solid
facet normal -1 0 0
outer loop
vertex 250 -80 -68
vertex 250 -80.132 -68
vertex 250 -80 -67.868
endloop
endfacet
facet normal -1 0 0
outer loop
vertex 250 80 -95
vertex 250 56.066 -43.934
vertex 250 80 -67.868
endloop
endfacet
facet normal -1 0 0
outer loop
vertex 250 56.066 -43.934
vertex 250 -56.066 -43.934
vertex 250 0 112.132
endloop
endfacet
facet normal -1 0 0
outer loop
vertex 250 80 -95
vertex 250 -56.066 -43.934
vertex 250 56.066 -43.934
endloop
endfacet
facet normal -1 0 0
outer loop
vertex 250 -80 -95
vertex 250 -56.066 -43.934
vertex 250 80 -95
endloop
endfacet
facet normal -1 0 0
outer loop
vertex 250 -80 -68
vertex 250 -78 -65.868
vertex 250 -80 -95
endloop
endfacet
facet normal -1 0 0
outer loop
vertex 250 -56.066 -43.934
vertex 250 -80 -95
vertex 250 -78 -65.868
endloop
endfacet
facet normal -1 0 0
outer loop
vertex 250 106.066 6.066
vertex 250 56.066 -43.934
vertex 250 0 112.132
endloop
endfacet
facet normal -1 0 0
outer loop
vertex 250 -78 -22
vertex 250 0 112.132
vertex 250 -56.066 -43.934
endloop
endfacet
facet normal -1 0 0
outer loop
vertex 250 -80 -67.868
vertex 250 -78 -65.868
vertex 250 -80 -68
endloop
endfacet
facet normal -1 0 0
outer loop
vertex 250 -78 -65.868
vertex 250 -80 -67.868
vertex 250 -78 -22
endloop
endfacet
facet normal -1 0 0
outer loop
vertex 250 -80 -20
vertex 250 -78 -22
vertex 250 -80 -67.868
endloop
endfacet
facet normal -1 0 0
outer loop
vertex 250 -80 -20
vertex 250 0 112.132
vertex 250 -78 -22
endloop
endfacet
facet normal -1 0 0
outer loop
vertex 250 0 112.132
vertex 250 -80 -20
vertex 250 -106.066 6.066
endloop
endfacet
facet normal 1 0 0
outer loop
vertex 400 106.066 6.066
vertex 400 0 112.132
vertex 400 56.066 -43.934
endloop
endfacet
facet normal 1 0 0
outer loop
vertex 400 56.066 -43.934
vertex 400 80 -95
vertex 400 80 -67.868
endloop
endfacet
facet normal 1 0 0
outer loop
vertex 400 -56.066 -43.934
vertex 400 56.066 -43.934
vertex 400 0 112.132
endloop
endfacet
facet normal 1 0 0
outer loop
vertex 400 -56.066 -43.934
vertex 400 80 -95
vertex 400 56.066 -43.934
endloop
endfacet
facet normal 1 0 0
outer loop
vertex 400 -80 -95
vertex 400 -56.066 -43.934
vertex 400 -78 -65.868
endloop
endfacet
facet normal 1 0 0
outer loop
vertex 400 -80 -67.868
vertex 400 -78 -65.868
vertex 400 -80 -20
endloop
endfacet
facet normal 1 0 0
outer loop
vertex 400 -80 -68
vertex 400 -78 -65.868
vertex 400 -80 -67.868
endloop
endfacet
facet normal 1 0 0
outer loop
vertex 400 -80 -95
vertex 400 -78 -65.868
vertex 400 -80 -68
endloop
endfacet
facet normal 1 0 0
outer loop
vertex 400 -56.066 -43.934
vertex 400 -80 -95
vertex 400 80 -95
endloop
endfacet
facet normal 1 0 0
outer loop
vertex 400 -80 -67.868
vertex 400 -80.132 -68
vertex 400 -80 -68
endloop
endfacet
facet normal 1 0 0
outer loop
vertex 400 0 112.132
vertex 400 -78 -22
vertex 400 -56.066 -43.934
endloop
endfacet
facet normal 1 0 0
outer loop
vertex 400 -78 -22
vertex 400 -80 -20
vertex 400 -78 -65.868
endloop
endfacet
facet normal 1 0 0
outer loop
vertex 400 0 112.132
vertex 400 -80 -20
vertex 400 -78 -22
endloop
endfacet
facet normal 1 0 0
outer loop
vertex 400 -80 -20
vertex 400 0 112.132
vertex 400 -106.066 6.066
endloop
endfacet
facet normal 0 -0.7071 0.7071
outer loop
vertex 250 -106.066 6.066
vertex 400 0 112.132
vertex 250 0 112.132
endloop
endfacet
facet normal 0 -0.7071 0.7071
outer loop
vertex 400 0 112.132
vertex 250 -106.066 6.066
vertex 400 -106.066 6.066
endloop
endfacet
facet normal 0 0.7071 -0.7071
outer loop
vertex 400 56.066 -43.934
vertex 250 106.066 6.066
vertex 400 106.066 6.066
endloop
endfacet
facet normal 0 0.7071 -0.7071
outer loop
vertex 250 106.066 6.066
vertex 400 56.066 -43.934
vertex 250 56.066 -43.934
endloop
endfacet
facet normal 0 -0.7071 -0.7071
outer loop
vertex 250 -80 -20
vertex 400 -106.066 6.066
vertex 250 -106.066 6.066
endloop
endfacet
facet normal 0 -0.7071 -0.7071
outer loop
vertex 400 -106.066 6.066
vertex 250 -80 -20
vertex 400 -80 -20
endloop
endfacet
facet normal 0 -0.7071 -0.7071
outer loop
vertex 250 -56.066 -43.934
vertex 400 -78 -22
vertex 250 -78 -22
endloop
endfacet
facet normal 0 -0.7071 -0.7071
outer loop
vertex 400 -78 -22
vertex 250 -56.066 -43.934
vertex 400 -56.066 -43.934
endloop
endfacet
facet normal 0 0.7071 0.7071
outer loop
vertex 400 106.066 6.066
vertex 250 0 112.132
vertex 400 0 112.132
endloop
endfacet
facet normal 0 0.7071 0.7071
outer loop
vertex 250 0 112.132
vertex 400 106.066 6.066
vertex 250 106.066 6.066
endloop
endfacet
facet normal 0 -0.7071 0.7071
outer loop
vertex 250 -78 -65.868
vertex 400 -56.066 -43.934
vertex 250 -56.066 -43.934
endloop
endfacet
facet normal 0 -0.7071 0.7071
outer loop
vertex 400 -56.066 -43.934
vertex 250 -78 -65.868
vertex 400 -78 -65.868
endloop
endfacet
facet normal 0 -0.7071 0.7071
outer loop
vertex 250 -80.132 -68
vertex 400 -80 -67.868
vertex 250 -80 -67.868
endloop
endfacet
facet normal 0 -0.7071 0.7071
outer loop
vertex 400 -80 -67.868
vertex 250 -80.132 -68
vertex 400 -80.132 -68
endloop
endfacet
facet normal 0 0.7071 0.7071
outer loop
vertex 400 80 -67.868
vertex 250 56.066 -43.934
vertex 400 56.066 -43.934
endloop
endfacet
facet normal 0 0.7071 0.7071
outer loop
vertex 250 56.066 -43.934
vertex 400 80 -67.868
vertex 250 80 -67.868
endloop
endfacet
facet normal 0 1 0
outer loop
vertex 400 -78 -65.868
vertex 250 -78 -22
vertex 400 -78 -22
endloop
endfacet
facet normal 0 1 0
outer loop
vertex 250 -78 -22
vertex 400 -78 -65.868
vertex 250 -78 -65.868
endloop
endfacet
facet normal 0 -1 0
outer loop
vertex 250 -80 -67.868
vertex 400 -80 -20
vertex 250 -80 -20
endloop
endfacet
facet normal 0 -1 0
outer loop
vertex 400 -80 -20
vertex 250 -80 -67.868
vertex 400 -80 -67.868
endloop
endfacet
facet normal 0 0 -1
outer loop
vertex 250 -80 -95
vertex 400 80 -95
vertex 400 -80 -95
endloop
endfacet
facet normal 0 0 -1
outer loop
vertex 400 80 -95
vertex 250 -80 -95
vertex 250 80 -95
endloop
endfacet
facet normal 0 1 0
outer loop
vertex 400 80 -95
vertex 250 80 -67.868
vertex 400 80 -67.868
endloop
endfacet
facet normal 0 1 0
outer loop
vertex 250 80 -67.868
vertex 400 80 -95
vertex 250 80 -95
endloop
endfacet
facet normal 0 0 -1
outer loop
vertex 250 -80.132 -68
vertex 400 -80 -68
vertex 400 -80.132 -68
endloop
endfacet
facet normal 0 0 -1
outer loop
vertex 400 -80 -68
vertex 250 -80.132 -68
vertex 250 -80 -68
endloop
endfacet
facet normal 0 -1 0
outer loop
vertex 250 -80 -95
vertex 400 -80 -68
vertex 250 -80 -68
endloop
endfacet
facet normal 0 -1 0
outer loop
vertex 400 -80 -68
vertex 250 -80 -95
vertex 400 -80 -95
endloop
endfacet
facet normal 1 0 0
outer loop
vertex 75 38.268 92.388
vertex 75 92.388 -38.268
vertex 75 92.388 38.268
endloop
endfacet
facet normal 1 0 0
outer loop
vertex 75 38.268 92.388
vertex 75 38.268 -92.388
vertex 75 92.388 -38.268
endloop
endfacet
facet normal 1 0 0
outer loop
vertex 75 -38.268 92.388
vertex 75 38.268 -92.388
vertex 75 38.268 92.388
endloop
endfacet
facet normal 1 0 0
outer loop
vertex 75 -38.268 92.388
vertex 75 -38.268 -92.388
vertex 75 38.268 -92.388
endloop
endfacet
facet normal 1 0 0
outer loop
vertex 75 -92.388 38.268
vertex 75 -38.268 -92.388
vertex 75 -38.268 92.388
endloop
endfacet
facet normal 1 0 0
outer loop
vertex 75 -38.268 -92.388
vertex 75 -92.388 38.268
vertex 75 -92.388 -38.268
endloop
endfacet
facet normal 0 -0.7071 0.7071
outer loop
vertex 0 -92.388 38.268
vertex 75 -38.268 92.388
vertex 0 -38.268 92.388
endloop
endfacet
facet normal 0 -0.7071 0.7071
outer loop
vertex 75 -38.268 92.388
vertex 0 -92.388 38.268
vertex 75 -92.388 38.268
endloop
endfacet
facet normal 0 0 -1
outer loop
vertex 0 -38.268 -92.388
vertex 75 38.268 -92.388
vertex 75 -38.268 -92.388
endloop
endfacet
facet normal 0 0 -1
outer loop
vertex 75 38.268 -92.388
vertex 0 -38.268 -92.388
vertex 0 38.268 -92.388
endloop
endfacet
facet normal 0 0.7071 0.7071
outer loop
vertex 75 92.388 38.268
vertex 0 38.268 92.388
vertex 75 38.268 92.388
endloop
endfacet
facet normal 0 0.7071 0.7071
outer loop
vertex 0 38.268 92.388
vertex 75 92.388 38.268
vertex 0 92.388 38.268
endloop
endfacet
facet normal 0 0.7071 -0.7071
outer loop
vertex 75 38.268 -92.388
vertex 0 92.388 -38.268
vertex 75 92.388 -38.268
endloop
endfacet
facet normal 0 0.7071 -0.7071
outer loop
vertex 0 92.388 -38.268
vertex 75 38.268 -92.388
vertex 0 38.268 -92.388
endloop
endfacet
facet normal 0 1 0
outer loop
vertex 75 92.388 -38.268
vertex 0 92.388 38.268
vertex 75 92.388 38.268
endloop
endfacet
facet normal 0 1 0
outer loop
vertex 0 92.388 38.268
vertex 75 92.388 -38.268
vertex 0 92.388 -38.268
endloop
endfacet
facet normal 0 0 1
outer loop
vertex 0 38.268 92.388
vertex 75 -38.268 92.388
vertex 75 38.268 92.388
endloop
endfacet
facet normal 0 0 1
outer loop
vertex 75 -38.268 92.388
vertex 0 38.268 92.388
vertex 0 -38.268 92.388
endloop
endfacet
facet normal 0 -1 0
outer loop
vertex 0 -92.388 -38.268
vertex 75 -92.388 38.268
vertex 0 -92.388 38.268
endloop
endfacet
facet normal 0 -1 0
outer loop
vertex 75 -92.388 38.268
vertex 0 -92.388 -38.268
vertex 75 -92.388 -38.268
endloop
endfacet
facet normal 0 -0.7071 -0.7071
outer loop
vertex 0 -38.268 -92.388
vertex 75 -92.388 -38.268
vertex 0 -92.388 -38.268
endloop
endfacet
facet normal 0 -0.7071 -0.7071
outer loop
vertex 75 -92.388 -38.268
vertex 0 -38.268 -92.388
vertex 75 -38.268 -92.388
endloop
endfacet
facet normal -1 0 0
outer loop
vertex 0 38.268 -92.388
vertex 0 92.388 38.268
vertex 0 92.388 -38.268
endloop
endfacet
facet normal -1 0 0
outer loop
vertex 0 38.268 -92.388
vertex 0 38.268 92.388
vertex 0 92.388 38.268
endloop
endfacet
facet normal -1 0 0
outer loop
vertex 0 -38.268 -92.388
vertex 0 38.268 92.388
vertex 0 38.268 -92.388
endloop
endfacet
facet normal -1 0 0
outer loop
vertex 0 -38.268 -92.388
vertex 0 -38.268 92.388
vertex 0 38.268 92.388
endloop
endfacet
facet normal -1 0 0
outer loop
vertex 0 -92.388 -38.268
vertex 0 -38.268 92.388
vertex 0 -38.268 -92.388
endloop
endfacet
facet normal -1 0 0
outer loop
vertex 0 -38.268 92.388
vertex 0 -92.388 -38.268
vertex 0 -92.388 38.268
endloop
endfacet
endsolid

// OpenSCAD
$fn = 8;

rotate([0,90,0]) {
    rotate([0,0,45/2]) cylinder(r=100,h=75);
}

module blocks(){
translate([250,0,-100]) rotate([45,0,0]) cube(150);
translate([250,0,-200]) rotate([45,0,0]) cube(150);
translate([250,-80,-80]) cube([150,2,100]);

}

module cubie() {
    difference() {
        blocks();
        translate([248,-100,-245]) cube([155,300,150]);
        translate([248,80,-200]) cube([155,30,150]);
        translate([248,-180,-218]) cube([155,100,150]);
    }
}

color("DimGrey") cubie();
